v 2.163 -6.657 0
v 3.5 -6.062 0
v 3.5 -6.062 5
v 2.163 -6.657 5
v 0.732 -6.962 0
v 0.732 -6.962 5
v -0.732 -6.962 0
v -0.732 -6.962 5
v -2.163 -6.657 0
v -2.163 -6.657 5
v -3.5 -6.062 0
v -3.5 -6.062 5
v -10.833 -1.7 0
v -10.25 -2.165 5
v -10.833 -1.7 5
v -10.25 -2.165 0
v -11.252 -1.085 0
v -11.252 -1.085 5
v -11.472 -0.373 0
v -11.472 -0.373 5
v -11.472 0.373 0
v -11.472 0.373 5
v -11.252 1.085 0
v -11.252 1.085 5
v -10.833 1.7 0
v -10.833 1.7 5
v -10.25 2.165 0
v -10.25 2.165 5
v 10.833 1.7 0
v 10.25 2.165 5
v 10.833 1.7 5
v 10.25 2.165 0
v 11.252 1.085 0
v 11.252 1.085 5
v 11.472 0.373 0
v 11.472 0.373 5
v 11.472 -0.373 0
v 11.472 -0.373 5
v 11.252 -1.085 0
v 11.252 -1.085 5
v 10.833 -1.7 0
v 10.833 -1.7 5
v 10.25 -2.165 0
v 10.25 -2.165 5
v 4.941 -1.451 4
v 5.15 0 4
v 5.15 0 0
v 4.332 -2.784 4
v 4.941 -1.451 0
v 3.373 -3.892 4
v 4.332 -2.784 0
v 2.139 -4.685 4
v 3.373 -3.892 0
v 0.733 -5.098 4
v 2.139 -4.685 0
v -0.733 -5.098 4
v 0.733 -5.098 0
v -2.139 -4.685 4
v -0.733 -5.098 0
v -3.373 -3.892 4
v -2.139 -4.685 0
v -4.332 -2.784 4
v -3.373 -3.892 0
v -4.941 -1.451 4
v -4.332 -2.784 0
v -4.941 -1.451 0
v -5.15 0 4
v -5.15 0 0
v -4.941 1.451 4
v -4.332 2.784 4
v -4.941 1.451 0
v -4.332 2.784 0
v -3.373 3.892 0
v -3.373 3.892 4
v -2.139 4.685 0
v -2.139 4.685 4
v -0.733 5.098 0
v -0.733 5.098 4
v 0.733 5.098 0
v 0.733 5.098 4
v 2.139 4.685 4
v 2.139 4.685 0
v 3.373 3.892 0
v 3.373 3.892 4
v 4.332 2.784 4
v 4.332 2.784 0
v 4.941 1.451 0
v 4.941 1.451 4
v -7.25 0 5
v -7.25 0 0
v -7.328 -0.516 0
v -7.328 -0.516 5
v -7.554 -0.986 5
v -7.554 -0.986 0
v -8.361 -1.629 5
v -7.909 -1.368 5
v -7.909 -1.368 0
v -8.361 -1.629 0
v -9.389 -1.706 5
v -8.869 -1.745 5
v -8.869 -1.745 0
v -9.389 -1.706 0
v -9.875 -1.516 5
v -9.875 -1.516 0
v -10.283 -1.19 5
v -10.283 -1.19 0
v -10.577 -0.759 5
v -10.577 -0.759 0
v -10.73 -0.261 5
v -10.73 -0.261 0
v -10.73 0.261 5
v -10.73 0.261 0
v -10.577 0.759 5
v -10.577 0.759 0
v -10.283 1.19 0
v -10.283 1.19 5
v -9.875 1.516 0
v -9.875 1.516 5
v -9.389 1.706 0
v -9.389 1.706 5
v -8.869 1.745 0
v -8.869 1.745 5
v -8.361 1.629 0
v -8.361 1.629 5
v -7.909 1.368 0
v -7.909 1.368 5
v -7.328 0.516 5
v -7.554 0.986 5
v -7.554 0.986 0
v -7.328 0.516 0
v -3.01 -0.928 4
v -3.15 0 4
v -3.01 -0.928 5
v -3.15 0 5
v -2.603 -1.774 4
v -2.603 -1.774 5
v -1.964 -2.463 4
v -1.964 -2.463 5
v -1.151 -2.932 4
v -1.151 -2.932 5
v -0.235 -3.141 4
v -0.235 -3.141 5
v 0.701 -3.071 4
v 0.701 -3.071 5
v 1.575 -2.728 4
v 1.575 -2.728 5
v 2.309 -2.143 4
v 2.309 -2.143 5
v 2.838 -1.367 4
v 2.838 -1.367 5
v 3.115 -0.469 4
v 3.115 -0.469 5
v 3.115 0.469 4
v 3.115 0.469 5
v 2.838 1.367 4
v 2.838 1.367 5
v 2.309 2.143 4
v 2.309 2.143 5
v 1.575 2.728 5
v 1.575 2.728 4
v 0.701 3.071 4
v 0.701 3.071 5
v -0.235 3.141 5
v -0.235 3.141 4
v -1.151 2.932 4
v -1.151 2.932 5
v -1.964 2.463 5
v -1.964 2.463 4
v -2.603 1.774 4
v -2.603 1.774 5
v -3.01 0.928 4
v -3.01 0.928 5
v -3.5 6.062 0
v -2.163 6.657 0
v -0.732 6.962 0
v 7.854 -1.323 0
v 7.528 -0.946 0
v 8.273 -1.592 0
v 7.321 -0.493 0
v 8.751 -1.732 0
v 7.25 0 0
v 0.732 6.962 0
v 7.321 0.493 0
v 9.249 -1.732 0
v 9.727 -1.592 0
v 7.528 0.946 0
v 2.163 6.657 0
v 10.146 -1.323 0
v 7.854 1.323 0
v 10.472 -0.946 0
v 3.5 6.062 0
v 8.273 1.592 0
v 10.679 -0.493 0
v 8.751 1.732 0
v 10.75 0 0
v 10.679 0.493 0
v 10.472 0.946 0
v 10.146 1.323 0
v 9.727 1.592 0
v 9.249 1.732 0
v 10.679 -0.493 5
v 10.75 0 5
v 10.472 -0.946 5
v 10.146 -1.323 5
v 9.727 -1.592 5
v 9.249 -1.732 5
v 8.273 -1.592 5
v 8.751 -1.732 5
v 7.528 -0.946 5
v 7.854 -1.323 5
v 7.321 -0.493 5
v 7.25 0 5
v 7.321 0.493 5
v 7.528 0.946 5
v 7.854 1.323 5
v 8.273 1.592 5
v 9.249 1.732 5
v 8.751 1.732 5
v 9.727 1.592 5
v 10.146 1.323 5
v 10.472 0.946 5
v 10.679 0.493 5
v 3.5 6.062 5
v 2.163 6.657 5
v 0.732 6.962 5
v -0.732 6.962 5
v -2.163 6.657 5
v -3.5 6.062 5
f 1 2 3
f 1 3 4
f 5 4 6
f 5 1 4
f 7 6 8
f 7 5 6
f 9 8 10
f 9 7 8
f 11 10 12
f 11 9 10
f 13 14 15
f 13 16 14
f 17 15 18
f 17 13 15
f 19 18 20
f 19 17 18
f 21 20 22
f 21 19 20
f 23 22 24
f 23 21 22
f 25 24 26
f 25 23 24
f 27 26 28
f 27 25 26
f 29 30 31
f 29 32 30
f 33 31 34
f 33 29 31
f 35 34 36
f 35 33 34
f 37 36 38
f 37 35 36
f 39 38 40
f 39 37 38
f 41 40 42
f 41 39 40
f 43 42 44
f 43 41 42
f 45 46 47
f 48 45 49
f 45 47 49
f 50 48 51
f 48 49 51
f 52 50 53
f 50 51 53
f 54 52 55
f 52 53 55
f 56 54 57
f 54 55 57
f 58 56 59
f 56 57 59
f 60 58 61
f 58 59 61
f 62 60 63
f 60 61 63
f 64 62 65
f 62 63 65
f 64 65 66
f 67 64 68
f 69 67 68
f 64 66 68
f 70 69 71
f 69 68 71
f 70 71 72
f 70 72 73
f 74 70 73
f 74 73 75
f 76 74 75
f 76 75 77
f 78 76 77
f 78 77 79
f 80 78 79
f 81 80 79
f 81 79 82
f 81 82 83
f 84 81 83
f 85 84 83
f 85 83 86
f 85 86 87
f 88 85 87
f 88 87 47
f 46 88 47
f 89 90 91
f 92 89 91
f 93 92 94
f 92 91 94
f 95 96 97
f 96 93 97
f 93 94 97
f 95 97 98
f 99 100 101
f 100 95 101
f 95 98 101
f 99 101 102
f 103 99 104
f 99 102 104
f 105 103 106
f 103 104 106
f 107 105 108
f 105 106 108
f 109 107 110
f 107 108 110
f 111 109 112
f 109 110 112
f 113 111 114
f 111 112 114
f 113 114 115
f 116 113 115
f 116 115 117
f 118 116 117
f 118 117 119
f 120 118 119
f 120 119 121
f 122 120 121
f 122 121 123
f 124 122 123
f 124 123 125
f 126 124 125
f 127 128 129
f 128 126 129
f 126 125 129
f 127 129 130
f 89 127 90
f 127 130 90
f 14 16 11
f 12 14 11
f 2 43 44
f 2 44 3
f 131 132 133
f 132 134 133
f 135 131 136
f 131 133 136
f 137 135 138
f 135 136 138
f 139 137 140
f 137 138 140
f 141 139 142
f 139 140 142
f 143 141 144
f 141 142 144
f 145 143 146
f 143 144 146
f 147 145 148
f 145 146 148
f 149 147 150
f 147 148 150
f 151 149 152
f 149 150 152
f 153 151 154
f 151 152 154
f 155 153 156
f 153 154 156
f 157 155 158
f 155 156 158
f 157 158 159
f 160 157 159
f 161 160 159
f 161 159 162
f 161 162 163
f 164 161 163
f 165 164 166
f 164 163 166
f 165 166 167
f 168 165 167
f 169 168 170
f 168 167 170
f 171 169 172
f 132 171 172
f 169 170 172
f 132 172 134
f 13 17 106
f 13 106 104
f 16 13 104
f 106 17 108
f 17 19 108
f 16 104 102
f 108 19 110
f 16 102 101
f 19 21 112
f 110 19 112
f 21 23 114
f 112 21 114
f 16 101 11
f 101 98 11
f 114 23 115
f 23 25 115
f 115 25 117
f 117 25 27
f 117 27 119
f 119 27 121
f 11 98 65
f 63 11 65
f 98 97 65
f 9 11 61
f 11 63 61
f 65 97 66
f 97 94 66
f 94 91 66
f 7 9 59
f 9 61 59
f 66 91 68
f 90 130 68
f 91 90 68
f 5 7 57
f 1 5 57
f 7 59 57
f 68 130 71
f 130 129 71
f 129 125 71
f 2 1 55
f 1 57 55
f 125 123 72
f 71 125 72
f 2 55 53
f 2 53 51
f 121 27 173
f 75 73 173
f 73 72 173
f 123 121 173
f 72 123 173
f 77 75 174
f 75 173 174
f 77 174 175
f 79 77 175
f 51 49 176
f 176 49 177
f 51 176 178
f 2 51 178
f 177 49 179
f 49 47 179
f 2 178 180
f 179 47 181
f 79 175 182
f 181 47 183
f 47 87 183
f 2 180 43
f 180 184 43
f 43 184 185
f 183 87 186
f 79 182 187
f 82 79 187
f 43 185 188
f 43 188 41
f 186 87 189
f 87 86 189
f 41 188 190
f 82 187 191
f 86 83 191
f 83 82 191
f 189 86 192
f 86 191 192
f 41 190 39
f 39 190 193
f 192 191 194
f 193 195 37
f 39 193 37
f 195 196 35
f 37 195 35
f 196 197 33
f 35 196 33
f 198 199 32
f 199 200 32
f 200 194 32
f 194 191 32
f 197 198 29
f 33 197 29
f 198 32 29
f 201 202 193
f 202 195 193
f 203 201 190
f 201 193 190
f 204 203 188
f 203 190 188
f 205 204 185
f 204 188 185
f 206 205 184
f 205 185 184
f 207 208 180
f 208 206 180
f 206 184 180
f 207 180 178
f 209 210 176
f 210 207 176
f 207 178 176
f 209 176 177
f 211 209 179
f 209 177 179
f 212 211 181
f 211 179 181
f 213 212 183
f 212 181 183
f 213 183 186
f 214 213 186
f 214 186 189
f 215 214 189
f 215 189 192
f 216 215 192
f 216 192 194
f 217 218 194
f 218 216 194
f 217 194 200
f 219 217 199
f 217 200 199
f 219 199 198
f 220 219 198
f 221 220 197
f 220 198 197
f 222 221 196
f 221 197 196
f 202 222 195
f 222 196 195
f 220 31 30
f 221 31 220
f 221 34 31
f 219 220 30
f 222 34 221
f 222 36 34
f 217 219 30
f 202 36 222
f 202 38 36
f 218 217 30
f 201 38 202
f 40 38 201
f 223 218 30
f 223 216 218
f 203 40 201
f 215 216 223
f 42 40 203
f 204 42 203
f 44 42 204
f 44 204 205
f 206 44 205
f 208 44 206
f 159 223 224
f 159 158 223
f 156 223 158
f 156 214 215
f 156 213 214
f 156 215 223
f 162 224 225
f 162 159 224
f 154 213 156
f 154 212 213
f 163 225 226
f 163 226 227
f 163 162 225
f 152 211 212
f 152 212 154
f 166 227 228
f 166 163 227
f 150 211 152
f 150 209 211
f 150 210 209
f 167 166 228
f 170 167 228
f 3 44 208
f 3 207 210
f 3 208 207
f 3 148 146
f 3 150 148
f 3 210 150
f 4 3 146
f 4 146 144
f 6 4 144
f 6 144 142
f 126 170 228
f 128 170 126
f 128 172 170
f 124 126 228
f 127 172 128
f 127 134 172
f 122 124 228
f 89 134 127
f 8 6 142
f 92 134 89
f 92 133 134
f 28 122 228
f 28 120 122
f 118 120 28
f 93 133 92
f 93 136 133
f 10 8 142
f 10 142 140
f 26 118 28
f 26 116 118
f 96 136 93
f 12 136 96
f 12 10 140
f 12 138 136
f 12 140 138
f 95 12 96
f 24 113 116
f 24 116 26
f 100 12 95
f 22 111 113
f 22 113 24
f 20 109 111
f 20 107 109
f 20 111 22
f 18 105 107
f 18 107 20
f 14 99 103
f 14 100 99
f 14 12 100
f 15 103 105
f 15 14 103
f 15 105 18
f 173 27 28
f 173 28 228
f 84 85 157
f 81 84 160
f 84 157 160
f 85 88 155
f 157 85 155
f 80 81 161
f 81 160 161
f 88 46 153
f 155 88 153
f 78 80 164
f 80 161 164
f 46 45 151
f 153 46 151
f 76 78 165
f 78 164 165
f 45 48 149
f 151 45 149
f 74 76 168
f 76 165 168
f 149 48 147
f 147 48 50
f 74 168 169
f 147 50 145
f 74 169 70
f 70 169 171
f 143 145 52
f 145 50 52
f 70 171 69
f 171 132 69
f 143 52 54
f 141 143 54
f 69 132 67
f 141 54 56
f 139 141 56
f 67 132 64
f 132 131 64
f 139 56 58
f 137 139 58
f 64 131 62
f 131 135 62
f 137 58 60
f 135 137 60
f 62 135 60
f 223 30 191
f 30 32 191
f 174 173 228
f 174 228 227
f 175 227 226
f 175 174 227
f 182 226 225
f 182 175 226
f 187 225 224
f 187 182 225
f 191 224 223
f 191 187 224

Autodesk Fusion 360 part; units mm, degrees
sketch "Sketch1" plane through (0, 0, 0) normal (0, 0, 1) x (1, 0, 0)
  circle A0 centre (0, 0) radius 5.15
  circle A1 centre (0, 0) radius 7
  circle A2 centre (9, 0) radius 2.5
  circle A3 centre (-9, 0) radius 2.5
  circle A4 centre (-9, 0) radius 1.75
  circle A5 centre (9, 0) radius 1.75
  line L0 (-10.25, 2.1651) -> (-3.5, 6.0622)
  line L1 (-9, 0) -> (9, 0)
  line L2 (-10.25, -2.1651) -> (-3.5, -6.0622)
  line L3 (0, 12) -> (0, 15)
  line L4 (10.25, 2.1651) -> (3.5, 6.0622)
  line L5 (10.25, -2.1651) -> (3.5, -6.0622)
  dimension "d1" = 10.3
  dimension "d2" = 14
  dimension "d3" = 5
  dimension "d4" = 5
  dimension "d5" = 9
  dimension "d6" = 9
  dimension "d7" = 3.5
  dimension "d8" = 3.5
extrude "Extrude1" add sketch "Sketch1" along normal blind 5 contours A0 A1 A2 A3 L1 | A0 A1 A2 A3 L1 | A1 A2 L1 | A1 A2 L1 | A1 A3 L1 | A1 A3 L1 | A1 A2 | A1 A2 L4 | A1 A2 L5 | A1 A3 L0 | A1 A3 | A1 A3 L2
sketch "Sketch2" plane through (0, 0, 5) normal (0, 0, 1) x (-1, 0, 0)
  circle A0 centre (-9, 0) radius 1.75
  circle A1 centre (0, 0) radius 5.15
  circle A2 centre (9, 0) radius 1.75
  line L0 (-10.25, -2.1651) -> (-3.5, -6.0622)
  arc A3 (-3.5, -6.0622) -> (3.5, -6.0622) centre (0, 0) ccw
  line L1 (3.5, -6.0622) -> (10.25, -2.1651)
  arc A4 (10.25, -2.1651) -> (10.25, 2.1651) centre (9, 0) ccw
  line L2 (10.25, 2.1651) -> (3.5, 6.0622)
  arc A5 (3.5, 6.0622) -> (-3.5, 6.0622) centre (0, 0) ccw
  line L3 (-3.5, 6.0622) -> (-10.25, 2.1651)
  arc A6 (-10.25, 2.1651) -> (-10.25, -2.1651) centre (-9, 0) ccw
  circle A7 centre (0, 0) radius 3.15
  dimension "d11" = -2
extrude "Extrude2" add sketch "Sketch2" against normal blind 1 contours A1
